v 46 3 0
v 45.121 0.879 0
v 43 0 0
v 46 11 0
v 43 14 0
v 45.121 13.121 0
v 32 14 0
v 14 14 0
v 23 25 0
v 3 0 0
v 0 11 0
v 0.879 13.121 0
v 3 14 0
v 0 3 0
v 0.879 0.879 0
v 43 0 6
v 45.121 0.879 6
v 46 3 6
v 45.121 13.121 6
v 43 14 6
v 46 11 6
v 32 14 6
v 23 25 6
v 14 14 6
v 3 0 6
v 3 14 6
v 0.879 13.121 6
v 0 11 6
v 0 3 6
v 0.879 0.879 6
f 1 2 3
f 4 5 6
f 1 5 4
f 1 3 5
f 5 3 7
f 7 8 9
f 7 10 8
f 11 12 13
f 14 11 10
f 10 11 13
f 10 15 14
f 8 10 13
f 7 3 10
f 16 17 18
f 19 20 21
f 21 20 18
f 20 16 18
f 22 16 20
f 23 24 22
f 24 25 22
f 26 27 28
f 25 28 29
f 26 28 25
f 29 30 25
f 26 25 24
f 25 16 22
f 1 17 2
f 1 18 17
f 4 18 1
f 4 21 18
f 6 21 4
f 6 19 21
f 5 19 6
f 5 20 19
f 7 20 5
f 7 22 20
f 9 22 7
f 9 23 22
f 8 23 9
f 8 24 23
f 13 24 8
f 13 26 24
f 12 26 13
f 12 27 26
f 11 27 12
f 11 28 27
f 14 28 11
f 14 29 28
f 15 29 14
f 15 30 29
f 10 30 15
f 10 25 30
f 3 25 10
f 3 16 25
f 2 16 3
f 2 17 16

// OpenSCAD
$fn = 32;
// ----------------------------------------------------------------------
// Ratchet pawl: 46 x 14 mm body, beak 11 mm сверху
// ----------------------------------------------------------------------

// --- parameters (mm) ---
profile_height = 6;       // extrusion height
profile_points = 15;      // points of the closed outline

profile = [[0, 3], [0.879, 0.879], [3, 0], [43, 0], [45.121, 0.879], [46, 3], [46, 11], [45.121, 13.121], [43, 14], [32, 14], [23, 25], [14, 14], [3, 14], [0.879, 13.121], [0, 11]];  // single closed polygon, 15 points, counter clockwise

// --- the one profile operation ---
linear_extrude(height = profile_height) polygon(points = profile);
